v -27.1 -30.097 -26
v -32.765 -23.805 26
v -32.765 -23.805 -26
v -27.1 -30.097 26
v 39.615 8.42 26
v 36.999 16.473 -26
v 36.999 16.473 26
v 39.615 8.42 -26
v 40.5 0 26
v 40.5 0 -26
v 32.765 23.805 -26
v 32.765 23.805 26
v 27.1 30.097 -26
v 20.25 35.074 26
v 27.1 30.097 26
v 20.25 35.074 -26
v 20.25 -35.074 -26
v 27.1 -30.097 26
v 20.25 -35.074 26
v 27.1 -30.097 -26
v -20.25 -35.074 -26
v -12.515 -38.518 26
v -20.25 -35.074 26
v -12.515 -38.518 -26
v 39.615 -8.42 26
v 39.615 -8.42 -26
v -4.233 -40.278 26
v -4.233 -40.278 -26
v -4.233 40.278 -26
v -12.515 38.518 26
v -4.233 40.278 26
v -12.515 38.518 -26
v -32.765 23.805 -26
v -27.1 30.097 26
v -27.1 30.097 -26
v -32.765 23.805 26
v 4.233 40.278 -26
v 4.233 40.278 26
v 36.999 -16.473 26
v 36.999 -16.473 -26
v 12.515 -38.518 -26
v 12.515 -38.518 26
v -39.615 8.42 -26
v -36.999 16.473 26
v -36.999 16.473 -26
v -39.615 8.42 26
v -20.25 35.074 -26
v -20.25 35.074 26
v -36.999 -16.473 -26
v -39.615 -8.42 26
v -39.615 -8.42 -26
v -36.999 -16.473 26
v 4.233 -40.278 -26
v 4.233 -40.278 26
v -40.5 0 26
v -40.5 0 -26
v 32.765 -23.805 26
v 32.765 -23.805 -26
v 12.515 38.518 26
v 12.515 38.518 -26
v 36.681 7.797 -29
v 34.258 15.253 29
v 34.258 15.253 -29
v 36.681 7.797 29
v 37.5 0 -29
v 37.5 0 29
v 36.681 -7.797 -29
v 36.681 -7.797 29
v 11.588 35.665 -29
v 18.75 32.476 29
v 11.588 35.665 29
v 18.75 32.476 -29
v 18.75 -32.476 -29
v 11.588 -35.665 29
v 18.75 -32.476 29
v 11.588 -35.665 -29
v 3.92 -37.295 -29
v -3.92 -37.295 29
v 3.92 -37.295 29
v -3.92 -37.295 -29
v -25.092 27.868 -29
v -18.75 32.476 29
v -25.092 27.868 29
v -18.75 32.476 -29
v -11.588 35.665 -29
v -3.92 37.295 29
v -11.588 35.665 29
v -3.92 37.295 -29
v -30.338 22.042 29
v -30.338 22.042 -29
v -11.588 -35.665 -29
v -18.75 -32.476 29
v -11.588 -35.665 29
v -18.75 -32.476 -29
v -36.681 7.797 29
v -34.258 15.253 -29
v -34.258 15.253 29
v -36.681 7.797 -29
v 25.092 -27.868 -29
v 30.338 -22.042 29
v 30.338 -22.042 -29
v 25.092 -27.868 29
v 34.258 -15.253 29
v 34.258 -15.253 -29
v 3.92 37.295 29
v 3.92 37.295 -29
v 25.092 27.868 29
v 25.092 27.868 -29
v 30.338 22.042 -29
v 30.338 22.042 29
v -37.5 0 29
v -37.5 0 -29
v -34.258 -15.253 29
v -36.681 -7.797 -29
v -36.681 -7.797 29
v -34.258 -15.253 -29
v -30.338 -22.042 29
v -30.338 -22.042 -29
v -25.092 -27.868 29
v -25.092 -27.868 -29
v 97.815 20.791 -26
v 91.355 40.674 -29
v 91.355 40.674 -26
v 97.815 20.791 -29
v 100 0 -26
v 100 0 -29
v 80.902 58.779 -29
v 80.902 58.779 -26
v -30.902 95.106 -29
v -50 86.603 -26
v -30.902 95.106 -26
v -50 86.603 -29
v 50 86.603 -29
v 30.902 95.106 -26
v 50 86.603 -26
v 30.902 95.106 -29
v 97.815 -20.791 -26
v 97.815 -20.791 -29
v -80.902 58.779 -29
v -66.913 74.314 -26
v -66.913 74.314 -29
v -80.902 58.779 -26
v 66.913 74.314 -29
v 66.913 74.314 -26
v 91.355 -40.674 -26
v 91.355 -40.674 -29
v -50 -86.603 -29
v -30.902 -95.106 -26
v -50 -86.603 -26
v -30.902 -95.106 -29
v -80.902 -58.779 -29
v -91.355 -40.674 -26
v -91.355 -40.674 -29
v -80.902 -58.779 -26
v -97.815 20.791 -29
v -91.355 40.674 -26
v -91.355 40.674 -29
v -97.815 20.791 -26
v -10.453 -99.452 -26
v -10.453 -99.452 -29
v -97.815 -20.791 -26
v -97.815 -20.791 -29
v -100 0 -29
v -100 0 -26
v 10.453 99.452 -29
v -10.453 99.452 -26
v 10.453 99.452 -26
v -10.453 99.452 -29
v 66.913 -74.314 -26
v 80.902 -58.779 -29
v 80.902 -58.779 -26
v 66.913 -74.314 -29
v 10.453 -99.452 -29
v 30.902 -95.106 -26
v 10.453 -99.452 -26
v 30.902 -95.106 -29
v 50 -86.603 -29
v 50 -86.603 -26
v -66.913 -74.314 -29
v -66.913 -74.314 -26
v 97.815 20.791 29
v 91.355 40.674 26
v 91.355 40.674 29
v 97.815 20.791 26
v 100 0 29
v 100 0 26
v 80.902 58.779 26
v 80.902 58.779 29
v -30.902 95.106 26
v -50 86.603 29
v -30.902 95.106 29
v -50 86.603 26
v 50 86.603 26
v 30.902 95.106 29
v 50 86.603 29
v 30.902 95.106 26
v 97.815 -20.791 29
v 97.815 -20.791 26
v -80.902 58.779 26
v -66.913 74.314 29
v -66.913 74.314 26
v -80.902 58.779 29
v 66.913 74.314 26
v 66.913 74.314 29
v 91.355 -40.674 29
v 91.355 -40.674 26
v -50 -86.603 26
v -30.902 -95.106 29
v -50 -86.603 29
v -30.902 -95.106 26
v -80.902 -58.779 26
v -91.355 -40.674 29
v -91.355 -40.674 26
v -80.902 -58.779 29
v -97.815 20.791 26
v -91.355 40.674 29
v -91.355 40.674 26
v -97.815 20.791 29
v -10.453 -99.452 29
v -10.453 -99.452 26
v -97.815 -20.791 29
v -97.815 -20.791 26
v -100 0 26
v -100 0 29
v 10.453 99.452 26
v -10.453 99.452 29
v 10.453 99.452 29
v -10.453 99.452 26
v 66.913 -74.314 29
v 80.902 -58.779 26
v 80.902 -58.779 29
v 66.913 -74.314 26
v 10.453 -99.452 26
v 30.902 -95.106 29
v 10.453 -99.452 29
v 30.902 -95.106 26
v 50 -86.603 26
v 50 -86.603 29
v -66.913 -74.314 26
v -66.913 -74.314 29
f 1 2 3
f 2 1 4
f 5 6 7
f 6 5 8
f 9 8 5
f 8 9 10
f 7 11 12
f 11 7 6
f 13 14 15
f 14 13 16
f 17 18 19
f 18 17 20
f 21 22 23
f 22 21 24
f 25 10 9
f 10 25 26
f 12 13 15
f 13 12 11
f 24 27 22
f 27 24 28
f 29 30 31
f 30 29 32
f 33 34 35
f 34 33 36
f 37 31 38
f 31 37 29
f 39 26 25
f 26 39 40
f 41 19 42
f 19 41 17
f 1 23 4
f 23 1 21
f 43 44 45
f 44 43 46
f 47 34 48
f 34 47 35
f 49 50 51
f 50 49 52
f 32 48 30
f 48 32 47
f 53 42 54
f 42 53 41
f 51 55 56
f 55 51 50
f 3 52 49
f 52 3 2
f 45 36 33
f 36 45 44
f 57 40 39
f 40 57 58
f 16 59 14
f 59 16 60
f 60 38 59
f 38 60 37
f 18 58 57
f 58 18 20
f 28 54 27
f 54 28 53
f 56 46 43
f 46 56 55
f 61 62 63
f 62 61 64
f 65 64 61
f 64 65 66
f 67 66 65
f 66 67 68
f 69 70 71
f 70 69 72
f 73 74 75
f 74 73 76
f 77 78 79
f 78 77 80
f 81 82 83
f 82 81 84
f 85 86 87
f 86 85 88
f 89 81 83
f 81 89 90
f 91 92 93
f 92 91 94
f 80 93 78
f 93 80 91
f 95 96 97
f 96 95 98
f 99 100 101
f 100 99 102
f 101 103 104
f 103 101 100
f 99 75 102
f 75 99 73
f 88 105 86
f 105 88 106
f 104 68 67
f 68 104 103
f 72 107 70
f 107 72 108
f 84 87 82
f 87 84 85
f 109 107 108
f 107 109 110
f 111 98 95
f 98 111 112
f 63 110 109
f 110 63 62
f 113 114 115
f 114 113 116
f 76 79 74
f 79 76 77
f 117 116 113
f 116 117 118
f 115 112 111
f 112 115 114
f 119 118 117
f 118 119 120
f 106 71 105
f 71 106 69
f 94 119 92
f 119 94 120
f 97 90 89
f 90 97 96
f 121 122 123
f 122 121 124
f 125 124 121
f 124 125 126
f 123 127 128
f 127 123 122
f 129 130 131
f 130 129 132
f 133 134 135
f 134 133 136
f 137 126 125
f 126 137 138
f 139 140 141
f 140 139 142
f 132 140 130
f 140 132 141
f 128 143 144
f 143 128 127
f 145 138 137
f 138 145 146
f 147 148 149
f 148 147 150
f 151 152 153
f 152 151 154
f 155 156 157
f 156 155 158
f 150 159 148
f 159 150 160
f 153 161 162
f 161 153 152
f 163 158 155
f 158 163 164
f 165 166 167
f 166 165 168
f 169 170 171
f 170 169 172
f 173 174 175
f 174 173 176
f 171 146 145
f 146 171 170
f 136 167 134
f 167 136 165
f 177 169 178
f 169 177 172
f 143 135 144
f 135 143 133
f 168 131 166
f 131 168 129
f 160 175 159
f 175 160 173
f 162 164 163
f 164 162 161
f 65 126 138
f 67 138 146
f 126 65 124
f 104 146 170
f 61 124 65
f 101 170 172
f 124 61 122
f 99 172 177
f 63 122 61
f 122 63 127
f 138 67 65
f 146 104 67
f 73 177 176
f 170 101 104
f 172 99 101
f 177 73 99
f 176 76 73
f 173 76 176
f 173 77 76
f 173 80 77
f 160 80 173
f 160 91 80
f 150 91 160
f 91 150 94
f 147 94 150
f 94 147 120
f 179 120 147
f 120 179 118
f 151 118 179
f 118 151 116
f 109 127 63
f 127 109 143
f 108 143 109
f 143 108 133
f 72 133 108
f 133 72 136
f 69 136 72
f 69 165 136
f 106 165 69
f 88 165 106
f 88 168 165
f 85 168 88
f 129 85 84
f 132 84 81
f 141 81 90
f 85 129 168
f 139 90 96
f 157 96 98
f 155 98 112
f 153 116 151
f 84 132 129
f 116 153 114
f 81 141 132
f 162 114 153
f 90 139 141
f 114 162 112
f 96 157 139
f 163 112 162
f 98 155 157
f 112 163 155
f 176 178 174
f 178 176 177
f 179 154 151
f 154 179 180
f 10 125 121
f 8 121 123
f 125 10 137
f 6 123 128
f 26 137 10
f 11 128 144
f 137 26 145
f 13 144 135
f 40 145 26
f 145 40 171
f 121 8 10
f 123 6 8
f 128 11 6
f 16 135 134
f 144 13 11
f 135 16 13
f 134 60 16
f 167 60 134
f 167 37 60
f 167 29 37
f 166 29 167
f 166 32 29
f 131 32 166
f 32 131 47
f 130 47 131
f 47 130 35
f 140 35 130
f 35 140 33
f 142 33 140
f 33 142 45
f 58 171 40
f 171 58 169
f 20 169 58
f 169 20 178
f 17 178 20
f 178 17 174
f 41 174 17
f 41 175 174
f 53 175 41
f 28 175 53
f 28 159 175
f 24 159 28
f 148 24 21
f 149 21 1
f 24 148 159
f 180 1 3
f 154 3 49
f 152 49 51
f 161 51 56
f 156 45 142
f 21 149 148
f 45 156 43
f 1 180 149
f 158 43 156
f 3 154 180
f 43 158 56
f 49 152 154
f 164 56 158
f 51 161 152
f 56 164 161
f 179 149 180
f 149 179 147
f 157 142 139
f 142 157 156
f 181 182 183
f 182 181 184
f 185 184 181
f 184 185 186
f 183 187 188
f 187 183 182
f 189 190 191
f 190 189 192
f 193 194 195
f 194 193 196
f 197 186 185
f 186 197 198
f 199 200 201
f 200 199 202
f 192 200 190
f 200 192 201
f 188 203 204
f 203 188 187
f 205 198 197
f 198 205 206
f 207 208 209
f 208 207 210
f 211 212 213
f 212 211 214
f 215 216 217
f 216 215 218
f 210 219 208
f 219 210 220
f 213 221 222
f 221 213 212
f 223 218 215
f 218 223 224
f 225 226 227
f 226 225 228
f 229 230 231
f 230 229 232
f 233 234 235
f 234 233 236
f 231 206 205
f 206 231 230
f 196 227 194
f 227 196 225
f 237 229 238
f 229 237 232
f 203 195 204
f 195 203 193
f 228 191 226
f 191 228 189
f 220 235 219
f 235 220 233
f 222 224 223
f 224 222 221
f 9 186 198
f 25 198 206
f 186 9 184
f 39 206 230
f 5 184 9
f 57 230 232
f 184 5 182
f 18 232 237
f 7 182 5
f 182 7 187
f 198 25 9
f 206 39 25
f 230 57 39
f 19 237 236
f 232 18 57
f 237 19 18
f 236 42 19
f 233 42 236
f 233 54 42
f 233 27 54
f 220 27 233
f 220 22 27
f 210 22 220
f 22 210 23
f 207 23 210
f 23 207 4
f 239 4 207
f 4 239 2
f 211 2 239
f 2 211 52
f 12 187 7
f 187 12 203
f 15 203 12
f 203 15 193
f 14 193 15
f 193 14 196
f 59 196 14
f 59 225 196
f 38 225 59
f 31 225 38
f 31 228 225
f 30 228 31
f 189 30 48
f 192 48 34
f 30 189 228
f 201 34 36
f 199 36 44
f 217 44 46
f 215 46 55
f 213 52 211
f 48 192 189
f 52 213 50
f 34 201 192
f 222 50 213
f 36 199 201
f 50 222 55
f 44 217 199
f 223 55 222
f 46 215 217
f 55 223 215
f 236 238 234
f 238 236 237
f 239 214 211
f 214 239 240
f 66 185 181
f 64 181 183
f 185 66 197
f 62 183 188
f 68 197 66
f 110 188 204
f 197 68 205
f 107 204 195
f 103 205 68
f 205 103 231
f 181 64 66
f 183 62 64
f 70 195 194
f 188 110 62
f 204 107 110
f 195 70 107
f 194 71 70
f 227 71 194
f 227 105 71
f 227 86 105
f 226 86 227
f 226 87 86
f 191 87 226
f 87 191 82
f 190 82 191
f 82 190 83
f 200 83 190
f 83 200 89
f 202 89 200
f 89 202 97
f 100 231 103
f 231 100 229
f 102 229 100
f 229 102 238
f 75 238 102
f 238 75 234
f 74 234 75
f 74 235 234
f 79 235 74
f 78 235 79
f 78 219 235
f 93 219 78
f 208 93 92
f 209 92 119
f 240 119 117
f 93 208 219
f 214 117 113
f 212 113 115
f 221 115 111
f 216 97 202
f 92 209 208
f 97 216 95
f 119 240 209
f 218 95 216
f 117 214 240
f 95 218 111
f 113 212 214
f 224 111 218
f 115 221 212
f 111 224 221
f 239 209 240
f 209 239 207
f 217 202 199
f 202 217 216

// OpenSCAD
/**
 *
 * @licstart
 *
 * Copyright (C) 2017  AlephObjects, Inc.
 *
 *
 * The JavaScript code in this page is free software: you can
 * redistribute it and/or modify it under the terms of the GNU
 * General Public License (GNU GPL) as published by the Free Software
 * Foundation, either version 3 of the License, or (at your option)
 * any later version.  The code is distributed WITHOUT ANY WARRANTY;
 * without even the implied warranty of MERCHANTABILITY or FITNESS
 * FOR A PARTICULAR PURPOSE.  See the GNU GPL for more details.
 *
 * As additional permission under GNU GPL version 3 section 7, you
 * may distribute non-source (e.g., minimized or compacted) forms of
 * that code without the copy of the GNU GPL normally required by
 * section 4, provided you include this license notice and a URL
 * through which recipients can access the Corresponding Source.
 *
 * @licend
 *
 */

outer_dia      = 200;
inner_dia      =  75;
height         =  55;
wall_thickness =  3;

module face() {
	difference() {
		cylinder(h=wall_thickness, r=outer_dia/2, center=true);
		cylinder(h=wall_thickness+5, r=inner_dia/2, center=true);
	}
}

module core() {
	difference() {
		cylinder(h=height+1,r=inner_dia/2+wall_thickness, center=true);
		cylinder(h=height+5,r=inner_dia/2               , center=true);
	}
}

core();

translate([0,0,-height/2])
face();
translate([0,0,height/2])
	face();
